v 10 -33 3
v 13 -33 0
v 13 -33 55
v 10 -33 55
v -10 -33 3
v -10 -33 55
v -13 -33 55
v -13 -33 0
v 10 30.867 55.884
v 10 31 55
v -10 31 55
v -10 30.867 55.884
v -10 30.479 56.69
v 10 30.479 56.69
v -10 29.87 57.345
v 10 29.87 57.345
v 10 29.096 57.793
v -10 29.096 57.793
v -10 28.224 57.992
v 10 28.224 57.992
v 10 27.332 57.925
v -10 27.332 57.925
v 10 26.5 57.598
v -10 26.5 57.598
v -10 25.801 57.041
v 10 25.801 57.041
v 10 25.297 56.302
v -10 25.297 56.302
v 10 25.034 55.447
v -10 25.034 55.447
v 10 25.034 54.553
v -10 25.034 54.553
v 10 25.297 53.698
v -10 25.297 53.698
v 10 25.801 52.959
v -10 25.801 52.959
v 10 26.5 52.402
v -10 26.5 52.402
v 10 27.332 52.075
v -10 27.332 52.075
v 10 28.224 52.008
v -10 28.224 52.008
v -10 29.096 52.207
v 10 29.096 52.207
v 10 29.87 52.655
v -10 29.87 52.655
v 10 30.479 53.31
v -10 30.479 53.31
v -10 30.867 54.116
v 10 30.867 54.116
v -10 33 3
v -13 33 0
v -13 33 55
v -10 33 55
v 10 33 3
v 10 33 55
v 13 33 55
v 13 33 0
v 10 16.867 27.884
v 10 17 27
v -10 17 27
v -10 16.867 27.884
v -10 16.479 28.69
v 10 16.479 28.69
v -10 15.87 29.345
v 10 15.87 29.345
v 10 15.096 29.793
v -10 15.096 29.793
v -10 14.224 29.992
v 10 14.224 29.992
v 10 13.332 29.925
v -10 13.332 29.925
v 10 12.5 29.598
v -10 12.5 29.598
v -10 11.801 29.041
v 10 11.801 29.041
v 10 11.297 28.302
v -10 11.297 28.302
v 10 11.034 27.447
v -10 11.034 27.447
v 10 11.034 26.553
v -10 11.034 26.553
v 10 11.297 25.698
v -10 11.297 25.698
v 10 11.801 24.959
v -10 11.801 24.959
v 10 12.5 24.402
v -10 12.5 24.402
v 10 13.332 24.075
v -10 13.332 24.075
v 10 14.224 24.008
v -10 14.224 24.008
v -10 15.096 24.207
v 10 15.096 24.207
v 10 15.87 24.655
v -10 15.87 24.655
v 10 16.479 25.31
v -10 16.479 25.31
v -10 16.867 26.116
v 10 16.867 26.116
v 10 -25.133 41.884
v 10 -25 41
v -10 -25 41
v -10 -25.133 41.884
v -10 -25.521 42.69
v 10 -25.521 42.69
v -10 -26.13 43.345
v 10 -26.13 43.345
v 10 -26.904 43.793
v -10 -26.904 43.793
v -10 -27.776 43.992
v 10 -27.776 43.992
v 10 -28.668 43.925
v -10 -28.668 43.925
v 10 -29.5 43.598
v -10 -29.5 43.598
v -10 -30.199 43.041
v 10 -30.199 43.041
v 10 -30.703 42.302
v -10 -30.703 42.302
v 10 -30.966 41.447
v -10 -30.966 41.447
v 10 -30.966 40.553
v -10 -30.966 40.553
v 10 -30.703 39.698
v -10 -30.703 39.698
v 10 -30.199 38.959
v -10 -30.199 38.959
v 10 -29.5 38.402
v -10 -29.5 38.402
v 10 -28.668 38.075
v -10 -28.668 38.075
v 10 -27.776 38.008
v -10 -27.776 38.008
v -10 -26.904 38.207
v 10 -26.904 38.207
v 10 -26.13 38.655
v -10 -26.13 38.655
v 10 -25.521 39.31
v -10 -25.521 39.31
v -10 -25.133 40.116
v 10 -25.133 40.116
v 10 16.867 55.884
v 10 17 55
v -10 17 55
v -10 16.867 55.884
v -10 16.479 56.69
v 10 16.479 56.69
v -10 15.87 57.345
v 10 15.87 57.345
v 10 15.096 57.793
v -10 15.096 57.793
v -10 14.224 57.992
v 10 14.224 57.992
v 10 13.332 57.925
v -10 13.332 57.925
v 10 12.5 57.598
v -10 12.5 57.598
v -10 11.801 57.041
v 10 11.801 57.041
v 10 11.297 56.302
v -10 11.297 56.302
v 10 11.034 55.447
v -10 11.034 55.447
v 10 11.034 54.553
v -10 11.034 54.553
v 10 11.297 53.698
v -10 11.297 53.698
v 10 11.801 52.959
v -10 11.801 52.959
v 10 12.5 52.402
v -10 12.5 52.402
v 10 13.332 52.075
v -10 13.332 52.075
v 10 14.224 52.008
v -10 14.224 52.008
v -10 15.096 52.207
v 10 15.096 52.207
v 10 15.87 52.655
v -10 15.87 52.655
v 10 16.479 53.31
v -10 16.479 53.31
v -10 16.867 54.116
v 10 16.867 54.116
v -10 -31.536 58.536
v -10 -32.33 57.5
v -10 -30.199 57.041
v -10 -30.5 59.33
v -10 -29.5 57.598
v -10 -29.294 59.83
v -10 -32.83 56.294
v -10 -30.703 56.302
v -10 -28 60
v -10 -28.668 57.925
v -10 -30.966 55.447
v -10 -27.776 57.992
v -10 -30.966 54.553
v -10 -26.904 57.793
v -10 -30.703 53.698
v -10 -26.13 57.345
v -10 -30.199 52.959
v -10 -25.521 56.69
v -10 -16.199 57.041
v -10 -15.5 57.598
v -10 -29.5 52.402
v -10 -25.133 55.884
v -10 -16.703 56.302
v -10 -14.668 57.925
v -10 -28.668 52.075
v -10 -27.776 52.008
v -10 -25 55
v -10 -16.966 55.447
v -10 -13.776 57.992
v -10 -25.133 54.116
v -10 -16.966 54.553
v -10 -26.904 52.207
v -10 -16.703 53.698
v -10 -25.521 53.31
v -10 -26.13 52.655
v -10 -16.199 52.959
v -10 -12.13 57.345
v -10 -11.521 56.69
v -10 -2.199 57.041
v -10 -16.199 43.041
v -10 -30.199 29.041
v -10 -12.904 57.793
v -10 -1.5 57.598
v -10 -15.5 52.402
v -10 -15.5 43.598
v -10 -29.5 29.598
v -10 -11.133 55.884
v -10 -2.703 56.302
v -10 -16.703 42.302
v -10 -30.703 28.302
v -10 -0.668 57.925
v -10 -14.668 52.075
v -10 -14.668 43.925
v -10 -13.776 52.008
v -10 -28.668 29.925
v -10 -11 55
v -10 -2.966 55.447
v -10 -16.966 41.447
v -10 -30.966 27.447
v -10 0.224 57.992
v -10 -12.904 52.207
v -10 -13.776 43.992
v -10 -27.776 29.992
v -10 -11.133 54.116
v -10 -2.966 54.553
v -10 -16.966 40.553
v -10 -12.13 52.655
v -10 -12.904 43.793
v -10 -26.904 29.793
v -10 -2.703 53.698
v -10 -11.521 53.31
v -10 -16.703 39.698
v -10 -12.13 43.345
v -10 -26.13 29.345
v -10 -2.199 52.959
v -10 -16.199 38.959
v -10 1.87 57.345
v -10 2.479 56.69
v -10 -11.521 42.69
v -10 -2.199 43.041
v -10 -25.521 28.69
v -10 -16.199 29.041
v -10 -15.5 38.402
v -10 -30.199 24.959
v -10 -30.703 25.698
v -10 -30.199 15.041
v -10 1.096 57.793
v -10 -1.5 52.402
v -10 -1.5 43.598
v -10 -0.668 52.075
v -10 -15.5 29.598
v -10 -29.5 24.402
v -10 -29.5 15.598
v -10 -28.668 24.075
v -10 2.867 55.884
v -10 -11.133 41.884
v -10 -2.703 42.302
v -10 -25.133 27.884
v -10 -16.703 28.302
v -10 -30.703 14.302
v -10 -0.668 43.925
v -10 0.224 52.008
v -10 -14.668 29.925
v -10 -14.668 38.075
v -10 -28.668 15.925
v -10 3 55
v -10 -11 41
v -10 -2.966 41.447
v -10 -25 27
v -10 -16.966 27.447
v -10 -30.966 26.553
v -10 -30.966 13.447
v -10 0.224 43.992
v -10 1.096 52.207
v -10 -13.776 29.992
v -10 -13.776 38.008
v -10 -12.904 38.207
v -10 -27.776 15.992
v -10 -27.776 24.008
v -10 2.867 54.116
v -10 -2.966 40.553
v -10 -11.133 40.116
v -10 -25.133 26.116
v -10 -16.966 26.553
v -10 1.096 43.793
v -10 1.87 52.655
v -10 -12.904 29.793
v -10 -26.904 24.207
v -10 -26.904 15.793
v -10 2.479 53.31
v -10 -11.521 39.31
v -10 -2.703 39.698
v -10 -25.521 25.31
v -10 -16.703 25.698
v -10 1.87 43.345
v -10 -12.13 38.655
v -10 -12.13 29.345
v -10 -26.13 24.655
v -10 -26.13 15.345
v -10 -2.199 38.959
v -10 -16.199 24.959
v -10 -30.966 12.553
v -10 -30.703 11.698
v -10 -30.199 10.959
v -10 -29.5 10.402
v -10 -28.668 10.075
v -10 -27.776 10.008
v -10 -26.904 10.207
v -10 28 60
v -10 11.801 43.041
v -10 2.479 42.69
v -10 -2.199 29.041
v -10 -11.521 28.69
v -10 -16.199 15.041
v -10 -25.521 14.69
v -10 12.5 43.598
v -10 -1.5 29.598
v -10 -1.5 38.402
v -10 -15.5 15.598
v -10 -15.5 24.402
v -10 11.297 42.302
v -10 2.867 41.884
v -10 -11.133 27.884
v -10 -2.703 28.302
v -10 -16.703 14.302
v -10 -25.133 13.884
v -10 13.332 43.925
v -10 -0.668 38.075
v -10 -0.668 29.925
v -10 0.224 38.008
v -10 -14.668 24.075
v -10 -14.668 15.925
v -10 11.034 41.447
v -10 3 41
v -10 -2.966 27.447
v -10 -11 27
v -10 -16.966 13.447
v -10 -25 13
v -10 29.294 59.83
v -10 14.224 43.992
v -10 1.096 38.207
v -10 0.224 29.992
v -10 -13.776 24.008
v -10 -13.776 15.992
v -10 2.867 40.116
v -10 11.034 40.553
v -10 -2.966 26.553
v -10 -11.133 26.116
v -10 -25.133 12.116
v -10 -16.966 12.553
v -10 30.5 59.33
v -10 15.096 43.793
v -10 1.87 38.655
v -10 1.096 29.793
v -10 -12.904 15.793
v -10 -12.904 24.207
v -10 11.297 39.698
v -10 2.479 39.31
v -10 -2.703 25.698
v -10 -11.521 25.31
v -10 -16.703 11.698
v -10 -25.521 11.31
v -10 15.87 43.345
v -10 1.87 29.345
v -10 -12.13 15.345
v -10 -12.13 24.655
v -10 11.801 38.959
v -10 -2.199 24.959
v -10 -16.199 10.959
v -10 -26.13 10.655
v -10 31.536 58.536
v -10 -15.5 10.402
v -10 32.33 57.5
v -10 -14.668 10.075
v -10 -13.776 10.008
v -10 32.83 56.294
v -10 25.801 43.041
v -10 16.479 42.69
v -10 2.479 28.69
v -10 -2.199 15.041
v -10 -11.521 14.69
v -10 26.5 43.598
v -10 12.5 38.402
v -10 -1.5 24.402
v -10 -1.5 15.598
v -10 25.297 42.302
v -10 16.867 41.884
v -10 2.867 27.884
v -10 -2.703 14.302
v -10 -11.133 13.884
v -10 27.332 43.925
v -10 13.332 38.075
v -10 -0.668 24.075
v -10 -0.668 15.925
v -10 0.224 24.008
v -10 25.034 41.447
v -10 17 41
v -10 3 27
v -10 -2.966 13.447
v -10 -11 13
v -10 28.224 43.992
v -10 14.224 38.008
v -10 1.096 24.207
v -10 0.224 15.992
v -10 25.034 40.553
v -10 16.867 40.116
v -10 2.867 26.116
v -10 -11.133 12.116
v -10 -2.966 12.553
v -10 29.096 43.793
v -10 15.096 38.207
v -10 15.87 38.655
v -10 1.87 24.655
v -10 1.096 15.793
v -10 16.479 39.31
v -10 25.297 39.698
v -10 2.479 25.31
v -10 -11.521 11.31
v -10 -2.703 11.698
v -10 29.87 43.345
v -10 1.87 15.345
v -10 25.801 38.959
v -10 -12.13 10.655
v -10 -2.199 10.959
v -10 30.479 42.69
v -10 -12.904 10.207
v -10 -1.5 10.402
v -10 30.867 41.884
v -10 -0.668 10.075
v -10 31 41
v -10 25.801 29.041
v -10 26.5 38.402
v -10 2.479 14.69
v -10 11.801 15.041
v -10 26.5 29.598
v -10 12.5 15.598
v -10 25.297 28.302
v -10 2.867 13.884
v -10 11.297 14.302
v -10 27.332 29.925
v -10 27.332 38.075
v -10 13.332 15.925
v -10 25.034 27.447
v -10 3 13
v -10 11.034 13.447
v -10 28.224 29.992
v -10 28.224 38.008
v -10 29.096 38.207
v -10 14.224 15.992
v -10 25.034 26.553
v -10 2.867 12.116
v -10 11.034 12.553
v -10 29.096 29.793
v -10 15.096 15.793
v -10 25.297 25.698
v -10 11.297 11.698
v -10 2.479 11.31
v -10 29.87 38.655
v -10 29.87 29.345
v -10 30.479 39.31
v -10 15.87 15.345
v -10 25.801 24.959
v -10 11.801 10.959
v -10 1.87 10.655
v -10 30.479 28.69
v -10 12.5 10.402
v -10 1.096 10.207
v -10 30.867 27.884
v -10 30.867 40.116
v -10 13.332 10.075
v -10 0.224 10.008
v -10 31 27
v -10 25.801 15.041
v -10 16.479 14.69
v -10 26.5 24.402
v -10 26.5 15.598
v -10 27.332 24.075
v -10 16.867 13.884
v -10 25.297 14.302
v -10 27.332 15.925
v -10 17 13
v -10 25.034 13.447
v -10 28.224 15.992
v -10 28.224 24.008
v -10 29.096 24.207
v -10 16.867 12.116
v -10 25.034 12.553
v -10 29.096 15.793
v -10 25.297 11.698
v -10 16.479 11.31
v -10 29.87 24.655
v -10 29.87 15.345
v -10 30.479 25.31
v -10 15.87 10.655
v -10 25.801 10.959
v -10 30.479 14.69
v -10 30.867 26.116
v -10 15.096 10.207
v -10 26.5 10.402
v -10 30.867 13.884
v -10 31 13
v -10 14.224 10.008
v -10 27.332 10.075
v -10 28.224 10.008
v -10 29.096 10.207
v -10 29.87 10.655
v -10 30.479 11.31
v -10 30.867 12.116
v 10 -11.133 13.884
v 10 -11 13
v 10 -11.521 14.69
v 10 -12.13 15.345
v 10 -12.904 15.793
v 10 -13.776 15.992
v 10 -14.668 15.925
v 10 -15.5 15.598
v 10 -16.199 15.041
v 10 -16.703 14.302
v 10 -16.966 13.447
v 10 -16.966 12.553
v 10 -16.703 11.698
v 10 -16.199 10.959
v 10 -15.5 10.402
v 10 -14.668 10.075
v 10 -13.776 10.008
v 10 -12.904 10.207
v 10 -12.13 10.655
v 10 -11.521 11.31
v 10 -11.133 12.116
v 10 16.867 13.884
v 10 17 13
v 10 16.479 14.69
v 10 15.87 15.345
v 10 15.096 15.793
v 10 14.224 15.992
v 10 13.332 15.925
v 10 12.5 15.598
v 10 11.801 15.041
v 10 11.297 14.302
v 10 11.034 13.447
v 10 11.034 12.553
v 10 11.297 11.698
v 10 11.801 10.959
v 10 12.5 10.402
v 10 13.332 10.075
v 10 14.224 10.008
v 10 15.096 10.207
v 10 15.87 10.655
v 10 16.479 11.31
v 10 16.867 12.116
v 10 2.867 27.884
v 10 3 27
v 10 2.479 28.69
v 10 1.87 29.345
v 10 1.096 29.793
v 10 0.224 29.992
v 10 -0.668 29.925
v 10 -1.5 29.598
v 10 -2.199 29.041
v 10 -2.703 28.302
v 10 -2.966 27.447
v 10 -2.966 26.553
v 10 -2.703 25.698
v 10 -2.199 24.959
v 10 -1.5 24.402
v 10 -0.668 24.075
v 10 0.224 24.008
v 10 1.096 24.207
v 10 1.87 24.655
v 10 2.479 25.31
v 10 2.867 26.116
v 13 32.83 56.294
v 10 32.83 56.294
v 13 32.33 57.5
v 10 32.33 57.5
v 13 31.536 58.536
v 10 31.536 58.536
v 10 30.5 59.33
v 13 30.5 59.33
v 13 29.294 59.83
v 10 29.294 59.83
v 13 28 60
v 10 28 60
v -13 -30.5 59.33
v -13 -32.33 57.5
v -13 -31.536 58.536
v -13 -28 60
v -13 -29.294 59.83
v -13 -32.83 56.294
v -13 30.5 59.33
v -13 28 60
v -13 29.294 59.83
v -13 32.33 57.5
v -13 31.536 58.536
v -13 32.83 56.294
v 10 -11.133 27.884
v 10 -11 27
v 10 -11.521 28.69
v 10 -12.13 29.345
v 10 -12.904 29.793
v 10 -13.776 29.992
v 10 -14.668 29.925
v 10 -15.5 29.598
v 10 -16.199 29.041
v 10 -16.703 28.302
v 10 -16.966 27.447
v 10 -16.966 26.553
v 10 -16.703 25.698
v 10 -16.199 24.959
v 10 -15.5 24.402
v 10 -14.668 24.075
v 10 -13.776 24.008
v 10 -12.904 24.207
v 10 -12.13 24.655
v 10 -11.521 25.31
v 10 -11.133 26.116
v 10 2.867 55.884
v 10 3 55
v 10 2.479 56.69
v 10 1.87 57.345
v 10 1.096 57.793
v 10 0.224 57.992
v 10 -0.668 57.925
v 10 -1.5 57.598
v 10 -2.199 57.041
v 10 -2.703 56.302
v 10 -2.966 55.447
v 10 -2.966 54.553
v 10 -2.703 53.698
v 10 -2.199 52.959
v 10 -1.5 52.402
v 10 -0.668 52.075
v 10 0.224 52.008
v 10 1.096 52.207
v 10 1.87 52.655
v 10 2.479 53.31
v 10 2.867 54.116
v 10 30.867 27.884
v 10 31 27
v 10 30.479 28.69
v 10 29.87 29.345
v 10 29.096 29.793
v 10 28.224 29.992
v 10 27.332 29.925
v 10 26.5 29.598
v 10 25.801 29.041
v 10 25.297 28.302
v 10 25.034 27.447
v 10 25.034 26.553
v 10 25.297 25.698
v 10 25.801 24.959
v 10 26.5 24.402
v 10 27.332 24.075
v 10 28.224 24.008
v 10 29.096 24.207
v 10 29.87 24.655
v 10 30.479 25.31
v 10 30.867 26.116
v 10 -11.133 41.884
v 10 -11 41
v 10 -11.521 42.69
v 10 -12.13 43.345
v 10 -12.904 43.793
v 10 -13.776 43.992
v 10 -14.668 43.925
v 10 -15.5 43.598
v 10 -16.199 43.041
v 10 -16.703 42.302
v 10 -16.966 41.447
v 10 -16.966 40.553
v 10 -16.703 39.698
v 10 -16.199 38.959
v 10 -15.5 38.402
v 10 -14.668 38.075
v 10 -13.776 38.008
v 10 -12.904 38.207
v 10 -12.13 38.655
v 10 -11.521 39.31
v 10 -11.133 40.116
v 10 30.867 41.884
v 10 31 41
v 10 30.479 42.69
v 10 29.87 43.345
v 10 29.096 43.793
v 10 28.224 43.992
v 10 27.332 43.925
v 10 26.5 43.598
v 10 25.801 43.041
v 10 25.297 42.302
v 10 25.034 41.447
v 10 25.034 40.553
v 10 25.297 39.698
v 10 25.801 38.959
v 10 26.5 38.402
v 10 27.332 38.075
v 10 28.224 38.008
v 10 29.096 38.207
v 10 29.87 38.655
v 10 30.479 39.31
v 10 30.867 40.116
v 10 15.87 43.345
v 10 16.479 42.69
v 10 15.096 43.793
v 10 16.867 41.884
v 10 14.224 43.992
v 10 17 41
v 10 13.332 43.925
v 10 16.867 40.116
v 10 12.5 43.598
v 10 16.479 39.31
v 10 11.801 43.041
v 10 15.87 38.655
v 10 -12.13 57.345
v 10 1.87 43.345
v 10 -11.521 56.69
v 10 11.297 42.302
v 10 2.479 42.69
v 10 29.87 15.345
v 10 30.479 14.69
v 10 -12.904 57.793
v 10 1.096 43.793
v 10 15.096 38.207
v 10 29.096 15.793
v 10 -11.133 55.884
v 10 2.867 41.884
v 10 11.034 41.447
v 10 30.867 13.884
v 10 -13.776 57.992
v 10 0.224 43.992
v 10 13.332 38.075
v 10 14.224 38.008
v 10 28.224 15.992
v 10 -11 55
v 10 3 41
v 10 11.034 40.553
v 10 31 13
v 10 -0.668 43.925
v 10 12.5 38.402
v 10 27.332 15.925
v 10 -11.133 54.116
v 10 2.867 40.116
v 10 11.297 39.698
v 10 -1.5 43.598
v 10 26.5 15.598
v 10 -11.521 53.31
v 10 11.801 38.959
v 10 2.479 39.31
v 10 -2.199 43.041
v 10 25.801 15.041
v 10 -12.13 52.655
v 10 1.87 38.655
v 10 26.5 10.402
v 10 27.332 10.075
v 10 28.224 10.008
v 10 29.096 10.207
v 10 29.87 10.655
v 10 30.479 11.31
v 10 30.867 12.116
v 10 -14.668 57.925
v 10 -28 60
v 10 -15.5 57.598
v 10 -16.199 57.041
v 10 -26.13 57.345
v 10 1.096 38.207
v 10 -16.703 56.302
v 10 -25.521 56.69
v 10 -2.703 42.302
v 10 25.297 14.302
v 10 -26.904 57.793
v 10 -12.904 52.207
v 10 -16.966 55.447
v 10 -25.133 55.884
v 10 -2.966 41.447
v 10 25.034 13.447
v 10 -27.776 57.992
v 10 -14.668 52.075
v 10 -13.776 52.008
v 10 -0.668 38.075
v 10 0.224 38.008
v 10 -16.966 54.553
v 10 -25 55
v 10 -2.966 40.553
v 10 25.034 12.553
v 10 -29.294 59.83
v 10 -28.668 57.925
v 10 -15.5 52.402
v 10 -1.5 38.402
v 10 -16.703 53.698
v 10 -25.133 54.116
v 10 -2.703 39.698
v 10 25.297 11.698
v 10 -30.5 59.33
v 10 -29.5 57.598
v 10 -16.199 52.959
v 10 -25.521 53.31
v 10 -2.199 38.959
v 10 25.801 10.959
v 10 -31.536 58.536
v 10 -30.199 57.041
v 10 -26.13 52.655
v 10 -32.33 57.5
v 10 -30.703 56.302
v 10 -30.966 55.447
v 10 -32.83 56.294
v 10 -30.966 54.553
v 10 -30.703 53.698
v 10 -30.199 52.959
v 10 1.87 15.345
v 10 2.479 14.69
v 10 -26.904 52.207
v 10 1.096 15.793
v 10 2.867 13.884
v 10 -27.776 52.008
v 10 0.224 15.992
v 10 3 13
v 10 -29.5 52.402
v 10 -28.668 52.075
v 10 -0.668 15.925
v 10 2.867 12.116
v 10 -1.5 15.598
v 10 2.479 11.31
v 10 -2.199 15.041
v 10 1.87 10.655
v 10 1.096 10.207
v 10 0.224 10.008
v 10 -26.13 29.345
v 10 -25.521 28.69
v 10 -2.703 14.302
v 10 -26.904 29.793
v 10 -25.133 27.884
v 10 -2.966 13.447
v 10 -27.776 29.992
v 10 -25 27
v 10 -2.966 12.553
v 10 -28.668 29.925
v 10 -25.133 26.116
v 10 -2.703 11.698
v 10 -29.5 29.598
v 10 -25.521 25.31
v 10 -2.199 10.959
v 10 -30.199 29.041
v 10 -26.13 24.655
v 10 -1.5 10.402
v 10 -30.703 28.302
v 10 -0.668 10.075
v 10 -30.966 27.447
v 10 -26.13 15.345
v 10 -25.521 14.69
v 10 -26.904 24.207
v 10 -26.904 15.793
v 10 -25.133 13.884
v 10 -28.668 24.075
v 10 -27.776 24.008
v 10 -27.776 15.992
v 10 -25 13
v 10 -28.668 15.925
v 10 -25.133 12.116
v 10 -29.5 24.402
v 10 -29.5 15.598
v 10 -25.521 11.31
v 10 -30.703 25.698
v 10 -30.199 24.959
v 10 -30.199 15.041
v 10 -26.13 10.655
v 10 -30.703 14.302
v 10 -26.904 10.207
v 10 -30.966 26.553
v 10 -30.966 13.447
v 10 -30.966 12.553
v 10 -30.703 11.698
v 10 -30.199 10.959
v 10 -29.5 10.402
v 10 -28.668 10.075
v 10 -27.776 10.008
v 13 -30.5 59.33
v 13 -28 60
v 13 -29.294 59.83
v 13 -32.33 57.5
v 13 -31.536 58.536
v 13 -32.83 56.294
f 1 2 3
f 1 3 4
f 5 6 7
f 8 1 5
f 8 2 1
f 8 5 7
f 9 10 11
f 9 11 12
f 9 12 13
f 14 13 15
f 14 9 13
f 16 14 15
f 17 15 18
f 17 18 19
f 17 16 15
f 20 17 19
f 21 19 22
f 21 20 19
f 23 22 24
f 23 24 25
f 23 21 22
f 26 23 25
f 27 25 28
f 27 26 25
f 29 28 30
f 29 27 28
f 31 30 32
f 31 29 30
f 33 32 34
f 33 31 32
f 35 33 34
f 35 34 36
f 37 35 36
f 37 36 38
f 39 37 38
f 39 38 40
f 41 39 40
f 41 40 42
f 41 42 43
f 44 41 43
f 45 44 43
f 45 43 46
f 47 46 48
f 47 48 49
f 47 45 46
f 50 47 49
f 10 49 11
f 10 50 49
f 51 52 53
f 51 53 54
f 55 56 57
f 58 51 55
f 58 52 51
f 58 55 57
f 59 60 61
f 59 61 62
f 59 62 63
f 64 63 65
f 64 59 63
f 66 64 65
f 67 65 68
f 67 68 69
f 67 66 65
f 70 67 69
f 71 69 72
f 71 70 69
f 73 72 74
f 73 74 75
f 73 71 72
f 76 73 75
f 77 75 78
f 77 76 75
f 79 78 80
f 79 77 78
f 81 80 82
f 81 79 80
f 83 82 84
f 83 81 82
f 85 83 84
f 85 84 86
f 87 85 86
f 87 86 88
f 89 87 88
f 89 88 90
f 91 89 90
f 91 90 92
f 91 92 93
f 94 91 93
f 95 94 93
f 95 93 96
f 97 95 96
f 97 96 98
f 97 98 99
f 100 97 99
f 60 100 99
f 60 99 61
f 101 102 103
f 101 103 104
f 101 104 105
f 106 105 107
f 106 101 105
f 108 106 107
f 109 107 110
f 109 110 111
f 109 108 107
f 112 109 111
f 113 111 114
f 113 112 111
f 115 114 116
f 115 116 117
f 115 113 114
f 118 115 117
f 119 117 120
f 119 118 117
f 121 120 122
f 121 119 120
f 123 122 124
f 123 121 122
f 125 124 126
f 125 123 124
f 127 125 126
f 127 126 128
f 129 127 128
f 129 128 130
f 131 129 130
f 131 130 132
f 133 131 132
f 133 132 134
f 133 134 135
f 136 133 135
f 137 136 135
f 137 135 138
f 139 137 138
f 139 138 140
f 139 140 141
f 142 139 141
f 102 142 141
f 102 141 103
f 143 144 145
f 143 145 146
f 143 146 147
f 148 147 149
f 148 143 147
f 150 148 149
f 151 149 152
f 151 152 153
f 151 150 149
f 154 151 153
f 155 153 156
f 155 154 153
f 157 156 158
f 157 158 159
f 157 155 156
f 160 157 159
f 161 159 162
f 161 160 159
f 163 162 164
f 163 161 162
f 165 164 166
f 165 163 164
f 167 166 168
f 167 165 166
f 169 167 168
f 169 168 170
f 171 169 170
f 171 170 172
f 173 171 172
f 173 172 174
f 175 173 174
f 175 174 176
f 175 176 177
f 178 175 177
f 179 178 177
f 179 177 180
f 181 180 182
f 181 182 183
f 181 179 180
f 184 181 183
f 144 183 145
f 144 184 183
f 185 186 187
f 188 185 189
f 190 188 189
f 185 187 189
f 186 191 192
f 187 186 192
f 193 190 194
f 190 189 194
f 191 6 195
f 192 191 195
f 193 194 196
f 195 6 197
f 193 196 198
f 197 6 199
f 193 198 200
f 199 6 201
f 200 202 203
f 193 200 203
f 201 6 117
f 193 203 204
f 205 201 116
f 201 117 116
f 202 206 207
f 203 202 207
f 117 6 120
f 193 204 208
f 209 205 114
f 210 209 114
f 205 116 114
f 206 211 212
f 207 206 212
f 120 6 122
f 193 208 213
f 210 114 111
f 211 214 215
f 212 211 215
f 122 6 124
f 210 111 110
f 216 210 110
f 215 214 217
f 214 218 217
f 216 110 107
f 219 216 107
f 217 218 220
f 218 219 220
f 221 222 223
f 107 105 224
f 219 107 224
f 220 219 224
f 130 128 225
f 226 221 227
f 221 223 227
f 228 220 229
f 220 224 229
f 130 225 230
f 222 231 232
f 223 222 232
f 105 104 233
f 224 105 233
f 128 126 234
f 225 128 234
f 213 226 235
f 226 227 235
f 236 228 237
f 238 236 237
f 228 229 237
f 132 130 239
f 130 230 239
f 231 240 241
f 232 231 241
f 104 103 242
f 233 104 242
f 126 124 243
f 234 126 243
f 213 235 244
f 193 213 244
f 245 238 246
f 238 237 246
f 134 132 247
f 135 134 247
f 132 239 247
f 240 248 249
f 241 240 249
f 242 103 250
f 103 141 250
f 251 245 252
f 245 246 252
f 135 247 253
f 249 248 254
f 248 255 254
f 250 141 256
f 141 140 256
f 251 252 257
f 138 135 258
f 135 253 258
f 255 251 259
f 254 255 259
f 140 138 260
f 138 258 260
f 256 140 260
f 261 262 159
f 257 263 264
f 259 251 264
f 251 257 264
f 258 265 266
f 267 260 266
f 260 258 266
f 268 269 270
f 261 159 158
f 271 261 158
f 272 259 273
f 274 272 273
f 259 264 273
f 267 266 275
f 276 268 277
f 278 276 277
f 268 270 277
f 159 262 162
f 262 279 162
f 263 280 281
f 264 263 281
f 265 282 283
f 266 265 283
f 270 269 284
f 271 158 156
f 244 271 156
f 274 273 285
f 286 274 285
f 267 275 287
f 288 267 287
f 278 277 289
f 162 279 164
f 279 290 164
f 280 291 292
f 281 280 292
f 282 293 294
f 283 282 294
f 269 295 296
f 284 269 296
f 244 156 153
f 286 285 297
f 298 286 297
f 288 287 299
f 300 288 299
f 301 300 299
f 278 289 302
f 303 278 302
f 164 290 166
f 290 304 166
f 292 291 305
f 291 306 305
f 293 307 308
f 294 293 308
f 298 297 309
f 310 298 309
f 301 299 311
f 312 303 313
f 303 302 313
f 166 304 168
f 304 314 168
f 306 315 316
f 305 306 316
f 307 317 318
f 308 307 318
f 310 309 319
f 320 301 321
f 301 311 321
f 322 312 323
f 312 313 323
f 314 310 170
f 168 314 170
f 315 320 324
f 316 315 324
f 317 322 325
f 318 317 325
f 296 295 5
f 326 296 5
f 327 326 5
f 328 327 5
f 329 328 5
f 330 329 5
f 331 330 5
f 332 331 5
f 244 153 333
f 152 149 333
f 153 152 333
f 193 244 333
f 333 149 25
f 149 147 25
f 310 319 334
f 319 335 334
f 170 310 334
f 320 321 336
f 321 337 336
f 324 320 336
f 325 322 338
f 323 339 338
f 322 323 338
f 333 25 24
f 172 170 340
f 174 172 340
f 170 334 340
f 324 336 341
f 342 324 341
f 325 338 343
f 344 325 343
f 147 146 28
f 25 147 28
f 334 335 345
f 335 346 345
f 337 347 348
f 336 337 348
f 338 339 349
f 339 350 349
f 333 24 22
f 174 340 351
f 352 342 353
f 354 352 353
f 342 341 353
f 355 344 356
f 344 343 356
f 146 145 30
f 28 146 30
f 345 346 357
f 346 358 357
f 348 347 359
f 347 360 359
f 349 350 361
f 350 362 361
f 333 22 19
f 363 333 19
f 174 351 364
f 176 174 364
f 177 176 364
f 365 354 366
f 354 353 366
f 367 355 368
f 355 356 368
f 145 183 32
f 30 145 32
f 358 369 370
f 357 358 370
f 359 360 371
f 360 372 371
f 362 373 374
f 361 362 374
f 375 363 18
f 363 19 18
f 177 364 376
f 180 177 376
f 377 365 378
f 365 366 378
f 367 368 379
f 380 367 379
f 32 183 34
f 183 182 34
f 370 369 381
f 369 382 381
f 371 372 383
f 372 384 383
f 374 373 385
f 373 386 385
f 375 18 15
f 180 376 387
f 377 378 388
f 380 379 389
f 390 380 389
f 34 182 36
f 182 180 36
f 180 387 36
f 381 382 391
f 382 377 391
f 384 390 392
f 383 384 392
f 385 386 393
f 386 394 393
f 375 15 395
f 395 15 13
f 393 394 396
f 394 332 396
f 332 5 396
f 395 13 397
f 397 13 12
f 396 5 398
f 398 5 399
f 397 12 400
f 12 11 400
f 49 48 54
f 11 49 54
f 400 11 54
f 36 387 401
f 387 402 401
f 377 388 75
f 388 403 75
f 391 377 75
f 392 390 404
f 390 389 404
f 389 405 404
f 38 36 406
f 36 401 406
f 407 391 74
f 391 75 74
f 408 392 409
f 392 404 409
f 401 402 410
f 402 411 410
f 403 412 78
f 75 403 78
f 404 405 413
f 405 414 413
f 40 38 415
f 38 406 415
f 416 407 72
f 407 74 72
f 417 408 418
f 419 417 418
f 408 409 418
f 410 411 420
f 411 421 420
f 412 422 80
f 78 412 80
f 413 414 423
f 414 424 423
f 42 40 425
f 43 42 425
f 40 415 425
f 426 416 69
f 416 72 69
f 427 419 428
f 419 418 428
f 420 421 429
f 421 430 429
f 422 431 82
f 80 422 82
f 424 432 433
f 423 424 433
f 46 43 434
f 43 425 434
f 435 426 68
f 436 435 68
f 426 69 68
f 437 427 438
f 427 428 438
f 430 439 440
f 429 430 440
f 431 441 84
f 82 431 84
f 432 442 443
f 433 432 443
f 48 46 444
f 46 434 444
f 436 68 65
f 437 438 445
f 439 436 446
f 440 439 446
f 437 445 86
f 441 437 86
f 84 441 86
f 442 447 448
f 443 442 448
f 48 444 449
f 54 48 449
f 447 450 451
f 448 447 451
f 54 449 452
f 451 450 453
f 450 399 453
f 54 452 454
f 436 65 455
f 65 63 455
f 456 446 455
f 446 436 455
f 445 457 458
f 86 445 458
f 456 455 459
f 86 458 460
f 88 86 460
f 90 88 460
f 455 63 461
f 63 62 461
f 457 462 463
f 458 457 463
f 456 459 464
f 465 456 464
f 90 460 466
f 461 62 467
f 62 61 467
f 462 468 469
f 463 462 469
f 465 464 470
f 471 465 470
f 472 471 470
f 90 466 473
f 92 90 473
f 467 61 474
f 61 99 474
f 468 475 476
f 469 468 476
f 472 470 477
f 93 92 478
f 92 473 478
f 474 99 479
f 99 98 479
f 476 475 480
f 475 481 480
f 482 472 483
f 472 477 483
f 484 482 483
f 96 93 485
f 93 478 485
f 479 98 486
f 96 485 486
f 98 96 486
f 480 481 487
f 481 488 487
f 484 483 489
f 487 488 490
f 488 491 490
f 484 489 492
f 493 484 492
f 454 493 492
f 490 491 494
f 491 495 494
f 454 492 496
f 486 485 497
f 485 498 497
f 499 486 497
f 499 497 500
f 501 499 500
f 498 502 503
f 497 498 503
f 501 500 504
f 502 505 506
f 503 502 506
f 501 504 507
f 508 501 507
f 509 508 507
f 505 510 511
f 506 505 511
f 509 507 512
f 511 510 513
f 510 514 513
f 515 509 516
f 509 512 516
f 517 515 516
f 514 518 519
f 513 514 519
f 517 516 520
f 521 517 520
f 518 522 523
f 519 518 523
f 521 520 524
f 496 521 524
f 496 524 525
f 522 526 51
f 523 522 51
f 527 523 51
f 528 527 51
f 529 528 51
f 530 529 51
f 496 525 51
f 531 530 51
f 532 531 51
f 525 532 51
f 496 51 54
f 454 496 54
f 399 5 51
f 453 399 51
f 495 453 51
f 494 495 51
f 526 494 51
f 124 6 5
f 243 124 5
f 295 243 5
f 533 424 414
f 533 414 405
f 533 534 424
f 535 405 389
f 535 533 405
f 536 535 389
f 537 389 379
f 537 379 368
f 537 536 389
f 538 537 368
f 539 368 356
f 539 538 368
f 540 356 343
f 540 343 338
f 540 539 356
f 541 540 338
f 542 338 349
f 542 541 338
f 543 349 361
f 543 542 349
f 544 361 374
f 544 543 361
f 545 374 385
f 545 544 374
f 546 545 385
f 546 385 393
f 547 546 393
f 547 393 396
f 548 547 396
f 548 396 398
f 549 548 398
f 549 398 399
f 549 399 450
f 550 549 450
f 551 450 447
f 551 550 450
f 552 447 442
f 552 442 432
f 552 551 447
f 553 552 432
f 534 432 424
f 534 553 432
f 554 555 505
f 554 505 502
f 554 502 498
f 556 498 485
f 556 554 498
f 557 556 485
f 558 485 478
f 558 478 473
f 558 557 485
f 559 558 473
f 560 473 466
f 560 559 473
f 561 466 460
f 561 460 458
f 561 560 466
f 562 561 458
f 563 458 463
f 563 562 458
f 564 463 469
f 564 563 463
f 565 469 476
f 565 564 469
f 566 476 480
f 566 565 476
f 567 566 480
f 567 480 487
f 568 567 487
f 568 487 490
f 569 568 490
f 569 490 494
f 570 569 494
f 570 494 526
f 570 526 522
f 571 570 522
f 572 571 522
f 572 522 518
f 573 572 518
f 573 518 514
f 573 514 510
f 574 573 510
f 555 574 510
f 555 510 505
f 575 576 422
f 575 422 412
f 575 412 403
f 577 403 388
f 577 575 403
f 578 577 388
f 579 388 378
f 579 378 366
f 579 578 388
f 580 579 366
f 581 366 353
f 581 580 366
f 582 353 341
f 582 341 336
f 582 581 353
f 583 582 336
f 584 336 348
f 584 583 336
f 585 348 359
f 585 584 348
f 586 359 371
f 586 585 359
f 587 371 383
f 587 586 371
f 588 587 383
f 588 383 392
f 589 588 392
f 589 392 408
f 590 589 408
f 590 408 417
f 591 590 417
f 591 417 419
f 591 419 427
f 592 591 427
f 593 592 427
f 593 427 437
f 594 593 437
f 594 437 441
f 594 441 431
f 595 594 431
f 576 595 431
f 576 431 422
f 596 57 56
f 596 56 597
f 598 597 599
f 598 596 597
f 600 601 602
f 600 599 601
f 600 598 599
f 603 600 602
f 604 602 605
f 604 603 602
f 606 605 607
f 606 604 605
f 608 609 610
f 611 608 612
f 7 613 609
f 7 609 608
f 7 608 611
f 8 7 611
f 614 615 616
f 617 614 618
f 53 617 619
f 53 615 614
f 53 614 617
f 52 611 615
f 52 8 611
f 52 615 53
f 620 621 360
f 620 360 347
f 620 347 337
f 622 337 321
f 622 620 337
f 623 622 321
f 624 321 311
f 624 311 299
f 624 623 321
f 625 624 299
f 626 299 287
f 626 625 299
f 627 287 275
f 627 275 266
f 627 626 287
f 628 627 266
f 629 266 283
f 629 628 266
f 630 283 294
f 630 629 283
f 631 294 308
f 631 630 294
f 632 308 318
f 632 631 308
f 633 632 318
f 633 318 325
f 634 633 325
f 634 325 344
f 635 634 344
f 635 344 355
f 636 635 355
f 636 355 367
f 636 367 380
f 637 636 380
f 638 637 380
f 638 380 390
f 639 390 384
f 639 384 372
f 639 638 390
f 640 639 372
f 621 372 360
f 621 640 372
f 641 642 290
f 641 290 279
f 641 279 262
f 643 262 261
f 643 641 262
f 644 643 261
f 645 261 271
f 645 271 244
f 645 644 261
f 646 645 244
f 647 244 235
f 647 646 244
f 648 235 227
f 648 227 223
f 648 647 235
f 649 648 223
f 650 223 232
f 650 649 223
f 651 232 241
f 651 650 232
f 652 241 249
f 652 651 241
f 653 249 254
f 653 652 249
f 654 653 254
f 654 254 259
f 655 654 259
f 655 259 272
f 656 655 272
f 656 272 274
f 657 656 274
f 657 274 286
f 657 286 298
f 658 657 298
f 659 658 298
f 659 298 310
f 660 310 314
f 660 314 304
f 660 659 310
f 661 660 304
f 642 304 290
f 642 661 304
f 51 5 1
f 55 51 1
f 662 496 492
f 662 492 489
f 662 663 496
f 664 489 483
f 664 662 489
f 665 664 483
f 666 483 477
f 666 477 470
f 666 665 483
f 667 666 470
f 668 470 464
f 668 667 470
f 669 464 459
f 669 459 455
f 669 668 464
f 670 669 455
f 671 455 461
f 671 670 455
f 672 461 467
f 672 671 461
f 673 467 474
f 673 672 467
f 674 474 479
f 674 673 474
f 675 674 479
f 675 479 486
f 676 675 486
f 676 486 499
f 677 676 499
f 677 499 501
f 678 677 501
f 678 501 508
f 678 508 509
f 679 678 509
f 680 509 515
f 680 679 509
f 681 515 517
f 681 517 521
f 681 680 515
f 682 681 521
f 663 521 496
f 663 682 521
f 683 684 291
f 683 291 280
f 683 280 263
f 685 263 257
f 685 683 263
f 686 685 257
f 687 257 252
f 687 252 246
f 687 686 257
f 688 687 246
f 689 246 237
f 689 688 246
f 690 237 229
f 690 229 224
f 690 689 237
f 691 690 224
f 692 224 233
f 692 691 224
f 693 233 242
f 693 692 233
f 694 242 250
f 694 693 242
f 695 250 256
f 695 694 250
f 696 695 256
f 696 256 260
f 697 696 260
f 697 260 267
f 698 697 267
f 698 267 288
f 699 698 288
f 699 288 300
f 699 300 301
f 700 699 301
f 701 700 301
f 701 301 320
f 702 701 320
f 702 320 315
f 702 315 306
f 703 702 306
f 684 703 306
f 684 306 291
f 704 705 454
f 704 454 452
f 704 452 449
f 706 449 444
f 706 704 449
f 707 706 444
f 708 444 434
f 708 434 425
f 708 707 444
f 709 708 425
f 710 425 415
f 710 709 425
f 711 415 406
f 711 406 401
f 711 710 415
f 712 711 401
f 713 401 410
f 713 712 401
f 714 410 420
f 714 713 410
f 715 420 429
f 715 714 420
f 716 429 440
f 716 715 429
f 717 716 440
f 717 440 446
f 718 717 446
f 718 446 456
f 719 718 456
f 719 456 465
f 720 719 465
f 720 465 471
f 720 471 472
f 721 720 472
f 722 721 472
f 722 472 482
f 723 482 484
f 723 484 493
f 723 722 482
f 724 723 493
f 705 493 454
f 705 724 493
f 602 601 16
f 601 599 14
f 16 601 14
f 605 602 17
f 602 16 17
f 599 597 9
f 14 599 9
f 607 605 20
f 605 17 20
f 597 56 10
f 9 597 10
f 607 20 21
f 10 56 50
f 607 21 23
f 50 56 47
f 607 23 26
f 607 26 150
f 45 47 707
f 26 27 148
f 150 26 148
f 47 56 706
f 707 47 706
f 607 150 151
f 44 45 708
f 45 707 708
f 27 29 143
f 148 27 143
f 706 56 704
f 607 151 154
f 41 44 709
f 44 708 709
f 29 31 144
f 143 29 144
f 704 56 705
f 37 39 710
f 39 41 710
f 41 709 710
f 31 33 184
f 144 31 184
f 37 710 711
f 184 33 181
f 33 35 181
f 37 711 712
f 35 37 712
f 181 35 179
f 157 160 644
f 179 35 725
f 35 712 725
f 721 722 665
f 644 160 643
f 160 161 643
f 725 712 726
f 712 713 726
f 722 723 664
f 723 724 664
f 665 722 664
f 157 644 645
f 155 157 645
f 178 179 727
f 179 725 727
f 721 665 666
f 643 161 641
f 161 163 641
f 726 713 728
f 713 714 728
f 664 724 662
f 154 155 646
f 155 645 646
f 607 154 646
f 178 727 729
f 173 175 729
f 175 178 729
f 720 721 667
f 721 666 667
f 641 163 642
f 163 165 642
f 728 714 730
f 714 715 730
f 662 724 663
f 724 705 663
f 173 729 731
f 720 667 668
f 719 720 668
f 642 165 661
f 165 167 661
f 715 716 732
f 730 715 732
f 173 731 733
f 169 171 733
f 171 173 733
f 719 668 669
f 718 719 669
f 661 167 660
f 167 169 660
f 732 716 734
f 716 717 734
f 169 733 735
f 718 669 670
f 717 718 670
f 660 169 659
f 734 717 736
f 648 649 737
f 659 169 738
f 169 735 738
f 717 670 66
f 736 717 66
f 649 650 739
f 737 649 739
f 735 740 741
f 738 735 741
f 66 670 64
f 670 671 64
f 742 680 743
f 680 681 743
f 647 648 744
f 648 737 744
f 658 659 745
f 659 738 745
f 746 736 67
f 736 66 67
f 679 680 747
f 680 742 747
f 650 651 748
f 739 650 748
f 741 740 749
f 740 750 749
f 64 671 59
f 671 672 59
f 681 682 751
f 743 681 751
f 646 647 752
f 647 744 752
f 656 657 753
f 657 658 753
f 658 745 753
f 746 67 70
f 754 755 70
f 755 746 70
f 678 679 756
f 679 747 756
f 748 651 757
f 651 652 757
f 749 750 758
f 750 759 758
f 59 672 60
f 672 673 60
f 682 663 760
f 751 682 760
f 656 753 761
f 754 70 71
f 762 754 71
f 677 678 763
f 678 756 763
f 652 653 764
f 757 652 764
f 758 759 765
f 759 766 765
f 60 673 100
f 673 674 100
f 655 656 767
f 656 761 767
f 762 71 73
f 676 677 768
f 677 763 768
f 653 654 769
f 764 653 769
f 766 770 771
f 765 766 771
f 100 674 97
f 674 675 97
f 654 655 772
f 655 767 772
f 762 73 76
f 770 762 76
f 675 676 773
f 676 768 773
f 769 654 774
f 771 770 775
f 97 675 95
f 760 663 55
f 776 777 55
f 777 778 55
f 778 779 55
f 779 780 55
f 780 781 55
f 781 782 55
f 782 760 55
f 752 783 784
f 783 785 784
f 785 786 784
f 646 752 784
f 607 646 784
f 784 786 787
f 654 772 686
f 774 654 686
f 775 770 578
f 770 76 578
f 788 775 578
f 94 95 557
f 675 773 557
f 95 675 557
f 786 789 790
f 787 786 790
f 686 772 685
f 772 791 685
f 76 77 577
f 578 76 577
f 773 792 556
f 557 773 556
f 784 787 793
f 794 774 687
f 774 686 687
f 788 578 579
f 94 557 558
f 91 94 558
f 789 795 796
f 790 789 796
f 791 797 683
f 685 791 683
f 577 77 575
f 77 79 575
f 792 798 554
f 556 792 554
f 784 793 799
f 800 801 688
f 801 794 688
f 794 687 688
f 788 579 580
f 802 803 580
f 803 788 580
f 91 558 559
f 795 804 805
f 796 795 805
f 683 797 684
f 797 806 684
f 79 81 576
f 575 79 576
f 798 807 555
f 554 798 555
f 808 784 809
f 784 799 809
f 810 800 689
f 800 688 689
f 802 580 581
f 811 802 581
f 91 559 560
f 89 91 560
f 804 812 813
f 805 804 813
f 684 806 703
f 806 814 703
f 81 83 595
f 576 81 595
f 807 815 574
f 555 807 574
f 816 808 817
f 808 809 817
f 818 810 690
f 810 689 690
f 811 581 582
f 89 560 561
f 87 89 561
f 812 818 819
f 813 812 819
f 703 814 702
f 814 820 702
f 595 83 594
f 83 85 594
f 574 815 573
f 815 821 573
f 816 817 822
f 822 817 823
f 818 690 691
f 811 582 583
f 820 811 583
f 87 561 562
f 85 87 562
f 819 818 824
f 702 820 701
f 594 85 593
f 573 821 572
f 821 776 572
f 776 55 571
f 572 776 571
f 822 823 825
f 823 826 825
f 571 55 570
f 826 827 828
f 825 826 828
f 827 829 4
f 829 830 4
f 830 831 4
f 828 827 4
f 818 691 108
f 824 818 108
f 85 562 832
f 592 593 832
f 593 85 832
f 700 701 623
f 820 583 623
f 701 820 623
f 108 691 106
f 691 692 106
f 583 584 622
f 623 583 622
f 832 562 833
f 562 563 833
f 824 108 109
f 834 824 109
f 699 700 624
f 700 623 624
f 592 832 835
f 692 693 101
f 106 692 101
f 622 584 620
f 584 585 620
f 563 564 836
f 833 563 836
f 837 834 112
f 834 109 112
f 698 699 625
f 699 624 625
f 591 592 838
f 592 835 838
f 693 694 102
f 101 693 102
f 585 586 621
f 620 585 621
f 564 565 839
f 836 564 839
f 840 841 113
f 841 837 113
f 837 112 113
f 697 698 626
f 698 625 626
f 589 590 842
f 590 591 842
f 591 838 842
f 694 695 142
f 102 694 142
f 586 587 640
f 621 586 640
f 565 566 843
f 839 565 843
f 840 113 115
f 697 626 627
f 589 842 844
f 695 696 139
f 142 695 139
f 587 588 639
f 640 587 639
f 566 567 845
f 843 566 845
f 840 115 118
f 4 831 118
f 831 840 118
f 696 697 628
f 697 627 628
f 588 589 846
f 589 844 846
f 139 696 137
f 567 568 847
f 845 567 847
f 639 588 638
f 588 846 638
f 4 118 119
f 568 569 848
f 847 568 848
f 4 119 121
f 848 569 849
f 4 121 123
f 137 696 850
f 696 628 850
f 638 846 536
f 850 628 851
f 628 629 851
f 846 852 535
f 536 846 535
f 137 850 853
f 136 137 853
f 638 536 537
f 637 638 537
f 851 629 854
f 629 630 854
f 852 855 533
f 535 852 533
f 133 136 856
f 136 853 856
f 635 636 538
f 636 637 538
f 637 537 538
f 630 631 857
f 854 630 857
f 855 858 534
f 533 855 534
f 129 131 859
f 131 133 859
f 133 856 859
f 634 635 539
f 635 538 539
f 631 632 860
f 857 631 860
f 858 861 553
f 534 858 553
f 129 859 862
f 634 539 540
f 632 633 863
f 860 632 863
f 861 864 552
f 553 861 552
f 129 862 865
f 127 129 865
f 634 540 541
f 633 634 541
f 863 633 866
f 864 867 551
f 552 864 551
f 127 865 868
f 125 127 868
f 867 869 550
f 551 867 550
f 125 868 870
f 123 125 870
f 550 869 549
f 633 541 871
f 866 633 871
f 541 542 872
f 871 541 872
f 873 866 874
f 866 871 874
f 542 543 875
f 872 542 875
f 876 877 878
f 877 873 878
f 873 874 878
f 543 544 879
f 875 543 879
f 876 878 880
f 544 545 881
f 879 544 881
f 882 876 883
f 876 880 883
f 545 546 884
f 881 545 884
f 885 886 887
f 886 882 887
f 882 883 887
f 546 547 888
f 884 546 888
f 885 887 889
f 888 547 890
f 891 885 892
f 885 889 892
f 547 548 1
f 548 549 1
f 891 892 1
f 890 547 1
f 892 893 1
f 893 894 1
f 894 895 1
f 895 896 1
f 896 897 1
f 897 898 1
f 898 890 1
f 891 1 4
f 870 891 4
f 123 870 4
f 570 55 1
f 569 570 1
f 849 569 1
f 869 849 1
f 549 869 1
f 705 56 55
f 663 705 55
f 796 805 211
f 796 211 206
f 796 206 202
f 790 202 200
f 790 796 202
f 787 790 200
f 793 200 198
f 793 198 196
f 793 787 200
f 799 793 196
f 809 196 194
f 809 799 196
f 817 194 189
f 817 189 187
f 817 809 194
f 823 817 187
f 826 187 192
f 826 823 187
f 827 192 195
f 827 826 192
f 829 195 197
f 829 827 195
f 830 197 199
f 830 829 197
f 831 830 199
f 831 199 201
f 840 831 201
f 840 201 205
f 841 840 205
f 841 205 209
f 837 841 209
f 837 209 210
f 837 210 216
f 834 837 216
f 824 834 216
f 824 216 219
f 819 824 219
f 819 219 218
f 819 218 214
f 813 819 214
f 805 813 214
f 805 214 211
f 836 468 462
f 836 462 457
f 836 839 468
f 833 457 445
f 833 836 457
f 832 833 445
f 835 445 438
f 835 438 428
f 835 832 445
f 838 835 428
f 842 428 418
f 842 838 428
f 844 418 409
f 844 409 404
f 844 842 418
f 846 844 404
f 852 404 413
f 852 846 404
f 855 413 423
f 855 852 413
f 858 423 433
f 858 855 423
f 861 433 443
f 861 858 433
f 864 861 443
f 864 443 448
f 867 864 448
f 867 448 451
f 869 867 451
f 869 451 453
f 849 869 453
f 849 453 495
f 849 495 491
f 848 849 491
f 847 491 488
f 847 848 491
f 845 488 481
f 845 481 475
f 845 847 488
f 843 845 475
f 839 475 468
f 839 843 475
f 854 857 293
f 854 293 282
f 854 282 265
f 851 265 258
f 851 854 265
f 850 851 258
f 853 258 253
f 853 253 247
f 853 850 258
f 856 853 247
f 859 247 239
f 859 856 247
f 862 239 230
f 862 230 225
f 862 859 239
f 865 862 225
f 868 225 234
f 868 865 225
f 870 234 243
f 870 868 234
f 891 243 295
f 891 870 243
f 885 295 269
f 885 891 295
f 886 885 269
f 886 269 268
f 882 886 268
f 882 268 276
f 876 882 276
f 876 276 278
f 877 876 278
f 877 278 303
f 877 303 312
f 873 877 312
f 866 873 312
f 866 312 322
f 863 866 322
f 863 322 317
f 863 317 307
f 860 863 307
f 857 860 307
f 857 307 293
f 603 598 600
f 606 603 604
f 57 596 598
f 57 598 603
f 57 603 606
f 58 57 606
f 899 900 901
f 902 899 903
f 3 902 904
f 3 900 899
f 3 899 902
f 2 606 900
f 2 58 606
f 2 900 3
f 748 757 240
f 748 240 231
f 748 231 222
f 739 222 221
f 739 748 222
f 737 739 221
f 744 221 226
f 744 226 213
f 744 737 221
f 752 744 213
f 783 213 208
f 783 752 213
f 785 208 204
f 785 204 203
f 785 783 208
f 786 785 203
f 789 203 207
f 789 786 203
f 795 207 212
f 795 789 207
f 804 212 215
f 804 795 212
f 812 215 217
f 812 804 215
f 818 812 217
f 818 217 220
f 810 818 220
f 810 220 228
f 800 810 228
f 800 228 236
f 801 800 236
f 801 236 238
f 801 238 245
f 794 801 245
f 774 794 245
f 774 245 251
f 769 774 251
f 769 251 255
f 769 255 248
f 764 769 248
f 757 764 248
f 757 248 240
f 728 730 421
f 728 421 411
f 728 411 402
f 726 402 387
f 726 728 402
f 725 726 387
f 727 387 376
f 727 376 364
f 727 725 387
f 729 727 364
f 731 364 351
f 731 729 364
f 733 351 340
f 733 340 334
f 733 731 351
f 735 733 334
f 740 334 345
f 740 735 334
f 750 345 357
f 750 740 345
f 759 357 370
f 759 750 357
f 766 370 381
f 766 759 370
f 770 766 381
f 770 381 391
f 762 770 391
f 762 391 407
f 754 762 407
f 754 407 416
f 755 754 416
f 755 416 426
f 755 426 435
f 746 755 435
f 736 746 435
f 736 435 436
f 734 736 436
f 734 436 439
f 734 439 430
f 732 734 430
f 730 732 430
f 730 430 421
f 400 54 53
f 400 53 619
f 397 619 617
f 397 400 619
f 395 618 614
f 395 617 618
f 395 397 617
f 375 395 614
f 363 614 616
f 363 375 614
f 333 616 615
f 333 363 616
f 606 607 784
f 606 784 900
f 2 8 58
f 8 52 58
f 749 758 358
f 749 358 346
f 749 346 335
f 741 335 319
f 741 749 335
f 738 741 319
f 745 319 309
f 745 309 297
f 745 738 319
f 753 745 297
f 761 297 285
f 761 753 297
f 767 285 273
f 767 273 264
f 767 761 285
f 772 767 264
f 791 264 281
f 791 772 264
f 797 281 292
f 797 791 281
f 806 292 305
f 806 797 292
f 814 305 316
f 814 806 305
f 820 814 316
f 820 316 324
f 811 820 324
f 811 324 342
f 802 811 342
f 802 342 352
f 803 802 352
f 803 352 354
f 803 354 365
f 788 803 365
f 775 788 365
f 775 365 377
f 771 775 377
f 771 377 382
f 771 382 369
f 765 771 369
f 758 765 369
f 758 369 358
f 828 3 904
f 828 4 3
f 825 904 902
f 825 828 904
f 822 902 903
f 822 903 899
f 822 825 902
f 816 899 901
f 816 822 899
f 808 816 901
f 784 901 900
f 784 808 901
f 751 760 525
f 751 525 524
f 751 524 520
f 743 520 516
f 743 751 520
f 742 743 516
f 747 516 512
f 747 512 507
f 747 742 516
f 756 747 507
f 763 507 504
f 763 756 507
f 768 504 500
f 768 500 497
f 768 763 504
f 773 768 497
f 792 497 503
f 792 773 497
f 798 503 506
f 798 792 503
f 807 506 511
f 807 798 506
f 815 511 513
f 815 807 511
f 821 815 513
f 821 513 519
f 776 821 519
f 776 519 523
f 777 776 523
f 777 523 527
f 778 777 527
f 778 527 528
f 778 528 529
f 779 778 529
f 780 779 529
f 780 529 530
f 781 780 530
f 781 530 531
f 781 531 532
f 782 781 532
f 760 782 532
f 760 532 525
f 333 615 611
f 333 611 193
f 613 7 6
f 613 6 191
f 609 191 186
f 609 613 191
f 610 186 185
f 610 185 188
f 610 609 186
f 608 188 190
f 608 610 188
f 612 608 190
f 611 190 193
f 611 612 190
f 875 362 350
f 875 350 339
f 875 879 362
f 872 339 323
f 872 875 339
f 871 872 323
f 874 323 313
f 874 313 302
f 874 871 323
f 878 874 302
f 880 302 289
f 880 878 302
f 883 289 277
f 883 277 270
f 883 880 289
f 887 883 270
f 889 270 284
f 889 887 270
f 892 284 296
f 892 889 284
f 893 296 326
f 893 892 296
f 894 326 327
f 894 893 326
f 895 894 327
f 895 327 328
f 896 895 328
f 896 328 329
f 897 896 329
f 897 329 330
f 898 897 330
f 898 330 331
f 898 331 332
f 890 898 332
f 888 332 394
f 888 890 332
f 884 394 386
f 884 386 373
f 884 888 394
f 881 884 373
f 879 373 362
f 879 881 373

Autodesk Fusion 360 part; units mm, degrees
sketch "Sketch1" plane through (0, 0, 0) normal (0, 0, 1) x (1, 0, 0)
  line L0 (10, -30) -> (-10, -30)
  line L1 (-10, -33) -> (-10, 33)
  line L2 (-10, 30) -> (10, 30)
  line L3 (10, 33) -> (10, -33)
  line L4 (-13, -33) -> (-13, 33)
  line L5 (-13, 33) -> (13, 33)
  line L6 (13, 33) -> (13, -33)
  line L7 (13, -33) -> (-13, -33)
extrude "Extrude1" add sketch "Sketch1" along normal blind 3
extrude "Extrude2" add sketch "Sketch1" along normal blind 60 contours L3 L5 L6 L7 | L1 L4 L5 L7
sketch "Sketch2" plane through (13, 0, 0) normal (1, 0, 0) x (0, 1, 0)
  line L0 (-33, 0) -> (33, 0)
  line L1 (33, 0) -> (33, 60)
  line L2 (33, 60) -> (-33, 60)
  line L3 (-33, 60) -> (-33, 0)
  circle A0 centre (-28, 55) radius 3
  circle A1 centre (0, 55) radius 3
  circle A2 centre (-14, 55) radius 3
  line L4 (0, 1.75) -> (0, 22.5)
  circle A3 centre (14, 55) radius 3
  circle A4 centre (28, 55) radius 3
  circle A5 centre (-28, 41) radius 3
  circle A6 centre (-14, 41) radius 3
  circle A7 centre (0, 41) radius 3
  circle A8 centre (14, 41) radius 3
  circle A9 centre (28, 41) radius 3
  circle A10 centre (-28, 27) radius 3
  circle A11 centre (-14, 27) radius 3
  circle A12 centre (0, 27) radius 3
  circle A13 centre (14, 27) radius 3
  circle A14 centre (28, 27) radius 3
  circle A15 centre (-28, 13) radius 3
  circle A16 centre (-14, 13) radius 3
  circle A17 centre (0, 13) radius 3
  circle A18 centre (14, 13) radius 3
  circle A19 centre (28, 13) radius 3
  dimension "d8" = 0
  dimension "d9" = -42
extrude "Extrude3" add sketch "Sketch2" against normal blind 26 contours A0 | A1 | A2 | L4 A17 | L4 A17 | A3 | A4 | A5 | A6 | A7 | A8 | A9 | A10 | A11 | A12 | A13 | A14 | A15 | A16 | A18 | A19
fillet "Fillet1" radius 5 4 edges at (11.5, -33, 60) (-11.5, -33, 60) (11.5, 33, 60) (-11.5, 33, 60)
